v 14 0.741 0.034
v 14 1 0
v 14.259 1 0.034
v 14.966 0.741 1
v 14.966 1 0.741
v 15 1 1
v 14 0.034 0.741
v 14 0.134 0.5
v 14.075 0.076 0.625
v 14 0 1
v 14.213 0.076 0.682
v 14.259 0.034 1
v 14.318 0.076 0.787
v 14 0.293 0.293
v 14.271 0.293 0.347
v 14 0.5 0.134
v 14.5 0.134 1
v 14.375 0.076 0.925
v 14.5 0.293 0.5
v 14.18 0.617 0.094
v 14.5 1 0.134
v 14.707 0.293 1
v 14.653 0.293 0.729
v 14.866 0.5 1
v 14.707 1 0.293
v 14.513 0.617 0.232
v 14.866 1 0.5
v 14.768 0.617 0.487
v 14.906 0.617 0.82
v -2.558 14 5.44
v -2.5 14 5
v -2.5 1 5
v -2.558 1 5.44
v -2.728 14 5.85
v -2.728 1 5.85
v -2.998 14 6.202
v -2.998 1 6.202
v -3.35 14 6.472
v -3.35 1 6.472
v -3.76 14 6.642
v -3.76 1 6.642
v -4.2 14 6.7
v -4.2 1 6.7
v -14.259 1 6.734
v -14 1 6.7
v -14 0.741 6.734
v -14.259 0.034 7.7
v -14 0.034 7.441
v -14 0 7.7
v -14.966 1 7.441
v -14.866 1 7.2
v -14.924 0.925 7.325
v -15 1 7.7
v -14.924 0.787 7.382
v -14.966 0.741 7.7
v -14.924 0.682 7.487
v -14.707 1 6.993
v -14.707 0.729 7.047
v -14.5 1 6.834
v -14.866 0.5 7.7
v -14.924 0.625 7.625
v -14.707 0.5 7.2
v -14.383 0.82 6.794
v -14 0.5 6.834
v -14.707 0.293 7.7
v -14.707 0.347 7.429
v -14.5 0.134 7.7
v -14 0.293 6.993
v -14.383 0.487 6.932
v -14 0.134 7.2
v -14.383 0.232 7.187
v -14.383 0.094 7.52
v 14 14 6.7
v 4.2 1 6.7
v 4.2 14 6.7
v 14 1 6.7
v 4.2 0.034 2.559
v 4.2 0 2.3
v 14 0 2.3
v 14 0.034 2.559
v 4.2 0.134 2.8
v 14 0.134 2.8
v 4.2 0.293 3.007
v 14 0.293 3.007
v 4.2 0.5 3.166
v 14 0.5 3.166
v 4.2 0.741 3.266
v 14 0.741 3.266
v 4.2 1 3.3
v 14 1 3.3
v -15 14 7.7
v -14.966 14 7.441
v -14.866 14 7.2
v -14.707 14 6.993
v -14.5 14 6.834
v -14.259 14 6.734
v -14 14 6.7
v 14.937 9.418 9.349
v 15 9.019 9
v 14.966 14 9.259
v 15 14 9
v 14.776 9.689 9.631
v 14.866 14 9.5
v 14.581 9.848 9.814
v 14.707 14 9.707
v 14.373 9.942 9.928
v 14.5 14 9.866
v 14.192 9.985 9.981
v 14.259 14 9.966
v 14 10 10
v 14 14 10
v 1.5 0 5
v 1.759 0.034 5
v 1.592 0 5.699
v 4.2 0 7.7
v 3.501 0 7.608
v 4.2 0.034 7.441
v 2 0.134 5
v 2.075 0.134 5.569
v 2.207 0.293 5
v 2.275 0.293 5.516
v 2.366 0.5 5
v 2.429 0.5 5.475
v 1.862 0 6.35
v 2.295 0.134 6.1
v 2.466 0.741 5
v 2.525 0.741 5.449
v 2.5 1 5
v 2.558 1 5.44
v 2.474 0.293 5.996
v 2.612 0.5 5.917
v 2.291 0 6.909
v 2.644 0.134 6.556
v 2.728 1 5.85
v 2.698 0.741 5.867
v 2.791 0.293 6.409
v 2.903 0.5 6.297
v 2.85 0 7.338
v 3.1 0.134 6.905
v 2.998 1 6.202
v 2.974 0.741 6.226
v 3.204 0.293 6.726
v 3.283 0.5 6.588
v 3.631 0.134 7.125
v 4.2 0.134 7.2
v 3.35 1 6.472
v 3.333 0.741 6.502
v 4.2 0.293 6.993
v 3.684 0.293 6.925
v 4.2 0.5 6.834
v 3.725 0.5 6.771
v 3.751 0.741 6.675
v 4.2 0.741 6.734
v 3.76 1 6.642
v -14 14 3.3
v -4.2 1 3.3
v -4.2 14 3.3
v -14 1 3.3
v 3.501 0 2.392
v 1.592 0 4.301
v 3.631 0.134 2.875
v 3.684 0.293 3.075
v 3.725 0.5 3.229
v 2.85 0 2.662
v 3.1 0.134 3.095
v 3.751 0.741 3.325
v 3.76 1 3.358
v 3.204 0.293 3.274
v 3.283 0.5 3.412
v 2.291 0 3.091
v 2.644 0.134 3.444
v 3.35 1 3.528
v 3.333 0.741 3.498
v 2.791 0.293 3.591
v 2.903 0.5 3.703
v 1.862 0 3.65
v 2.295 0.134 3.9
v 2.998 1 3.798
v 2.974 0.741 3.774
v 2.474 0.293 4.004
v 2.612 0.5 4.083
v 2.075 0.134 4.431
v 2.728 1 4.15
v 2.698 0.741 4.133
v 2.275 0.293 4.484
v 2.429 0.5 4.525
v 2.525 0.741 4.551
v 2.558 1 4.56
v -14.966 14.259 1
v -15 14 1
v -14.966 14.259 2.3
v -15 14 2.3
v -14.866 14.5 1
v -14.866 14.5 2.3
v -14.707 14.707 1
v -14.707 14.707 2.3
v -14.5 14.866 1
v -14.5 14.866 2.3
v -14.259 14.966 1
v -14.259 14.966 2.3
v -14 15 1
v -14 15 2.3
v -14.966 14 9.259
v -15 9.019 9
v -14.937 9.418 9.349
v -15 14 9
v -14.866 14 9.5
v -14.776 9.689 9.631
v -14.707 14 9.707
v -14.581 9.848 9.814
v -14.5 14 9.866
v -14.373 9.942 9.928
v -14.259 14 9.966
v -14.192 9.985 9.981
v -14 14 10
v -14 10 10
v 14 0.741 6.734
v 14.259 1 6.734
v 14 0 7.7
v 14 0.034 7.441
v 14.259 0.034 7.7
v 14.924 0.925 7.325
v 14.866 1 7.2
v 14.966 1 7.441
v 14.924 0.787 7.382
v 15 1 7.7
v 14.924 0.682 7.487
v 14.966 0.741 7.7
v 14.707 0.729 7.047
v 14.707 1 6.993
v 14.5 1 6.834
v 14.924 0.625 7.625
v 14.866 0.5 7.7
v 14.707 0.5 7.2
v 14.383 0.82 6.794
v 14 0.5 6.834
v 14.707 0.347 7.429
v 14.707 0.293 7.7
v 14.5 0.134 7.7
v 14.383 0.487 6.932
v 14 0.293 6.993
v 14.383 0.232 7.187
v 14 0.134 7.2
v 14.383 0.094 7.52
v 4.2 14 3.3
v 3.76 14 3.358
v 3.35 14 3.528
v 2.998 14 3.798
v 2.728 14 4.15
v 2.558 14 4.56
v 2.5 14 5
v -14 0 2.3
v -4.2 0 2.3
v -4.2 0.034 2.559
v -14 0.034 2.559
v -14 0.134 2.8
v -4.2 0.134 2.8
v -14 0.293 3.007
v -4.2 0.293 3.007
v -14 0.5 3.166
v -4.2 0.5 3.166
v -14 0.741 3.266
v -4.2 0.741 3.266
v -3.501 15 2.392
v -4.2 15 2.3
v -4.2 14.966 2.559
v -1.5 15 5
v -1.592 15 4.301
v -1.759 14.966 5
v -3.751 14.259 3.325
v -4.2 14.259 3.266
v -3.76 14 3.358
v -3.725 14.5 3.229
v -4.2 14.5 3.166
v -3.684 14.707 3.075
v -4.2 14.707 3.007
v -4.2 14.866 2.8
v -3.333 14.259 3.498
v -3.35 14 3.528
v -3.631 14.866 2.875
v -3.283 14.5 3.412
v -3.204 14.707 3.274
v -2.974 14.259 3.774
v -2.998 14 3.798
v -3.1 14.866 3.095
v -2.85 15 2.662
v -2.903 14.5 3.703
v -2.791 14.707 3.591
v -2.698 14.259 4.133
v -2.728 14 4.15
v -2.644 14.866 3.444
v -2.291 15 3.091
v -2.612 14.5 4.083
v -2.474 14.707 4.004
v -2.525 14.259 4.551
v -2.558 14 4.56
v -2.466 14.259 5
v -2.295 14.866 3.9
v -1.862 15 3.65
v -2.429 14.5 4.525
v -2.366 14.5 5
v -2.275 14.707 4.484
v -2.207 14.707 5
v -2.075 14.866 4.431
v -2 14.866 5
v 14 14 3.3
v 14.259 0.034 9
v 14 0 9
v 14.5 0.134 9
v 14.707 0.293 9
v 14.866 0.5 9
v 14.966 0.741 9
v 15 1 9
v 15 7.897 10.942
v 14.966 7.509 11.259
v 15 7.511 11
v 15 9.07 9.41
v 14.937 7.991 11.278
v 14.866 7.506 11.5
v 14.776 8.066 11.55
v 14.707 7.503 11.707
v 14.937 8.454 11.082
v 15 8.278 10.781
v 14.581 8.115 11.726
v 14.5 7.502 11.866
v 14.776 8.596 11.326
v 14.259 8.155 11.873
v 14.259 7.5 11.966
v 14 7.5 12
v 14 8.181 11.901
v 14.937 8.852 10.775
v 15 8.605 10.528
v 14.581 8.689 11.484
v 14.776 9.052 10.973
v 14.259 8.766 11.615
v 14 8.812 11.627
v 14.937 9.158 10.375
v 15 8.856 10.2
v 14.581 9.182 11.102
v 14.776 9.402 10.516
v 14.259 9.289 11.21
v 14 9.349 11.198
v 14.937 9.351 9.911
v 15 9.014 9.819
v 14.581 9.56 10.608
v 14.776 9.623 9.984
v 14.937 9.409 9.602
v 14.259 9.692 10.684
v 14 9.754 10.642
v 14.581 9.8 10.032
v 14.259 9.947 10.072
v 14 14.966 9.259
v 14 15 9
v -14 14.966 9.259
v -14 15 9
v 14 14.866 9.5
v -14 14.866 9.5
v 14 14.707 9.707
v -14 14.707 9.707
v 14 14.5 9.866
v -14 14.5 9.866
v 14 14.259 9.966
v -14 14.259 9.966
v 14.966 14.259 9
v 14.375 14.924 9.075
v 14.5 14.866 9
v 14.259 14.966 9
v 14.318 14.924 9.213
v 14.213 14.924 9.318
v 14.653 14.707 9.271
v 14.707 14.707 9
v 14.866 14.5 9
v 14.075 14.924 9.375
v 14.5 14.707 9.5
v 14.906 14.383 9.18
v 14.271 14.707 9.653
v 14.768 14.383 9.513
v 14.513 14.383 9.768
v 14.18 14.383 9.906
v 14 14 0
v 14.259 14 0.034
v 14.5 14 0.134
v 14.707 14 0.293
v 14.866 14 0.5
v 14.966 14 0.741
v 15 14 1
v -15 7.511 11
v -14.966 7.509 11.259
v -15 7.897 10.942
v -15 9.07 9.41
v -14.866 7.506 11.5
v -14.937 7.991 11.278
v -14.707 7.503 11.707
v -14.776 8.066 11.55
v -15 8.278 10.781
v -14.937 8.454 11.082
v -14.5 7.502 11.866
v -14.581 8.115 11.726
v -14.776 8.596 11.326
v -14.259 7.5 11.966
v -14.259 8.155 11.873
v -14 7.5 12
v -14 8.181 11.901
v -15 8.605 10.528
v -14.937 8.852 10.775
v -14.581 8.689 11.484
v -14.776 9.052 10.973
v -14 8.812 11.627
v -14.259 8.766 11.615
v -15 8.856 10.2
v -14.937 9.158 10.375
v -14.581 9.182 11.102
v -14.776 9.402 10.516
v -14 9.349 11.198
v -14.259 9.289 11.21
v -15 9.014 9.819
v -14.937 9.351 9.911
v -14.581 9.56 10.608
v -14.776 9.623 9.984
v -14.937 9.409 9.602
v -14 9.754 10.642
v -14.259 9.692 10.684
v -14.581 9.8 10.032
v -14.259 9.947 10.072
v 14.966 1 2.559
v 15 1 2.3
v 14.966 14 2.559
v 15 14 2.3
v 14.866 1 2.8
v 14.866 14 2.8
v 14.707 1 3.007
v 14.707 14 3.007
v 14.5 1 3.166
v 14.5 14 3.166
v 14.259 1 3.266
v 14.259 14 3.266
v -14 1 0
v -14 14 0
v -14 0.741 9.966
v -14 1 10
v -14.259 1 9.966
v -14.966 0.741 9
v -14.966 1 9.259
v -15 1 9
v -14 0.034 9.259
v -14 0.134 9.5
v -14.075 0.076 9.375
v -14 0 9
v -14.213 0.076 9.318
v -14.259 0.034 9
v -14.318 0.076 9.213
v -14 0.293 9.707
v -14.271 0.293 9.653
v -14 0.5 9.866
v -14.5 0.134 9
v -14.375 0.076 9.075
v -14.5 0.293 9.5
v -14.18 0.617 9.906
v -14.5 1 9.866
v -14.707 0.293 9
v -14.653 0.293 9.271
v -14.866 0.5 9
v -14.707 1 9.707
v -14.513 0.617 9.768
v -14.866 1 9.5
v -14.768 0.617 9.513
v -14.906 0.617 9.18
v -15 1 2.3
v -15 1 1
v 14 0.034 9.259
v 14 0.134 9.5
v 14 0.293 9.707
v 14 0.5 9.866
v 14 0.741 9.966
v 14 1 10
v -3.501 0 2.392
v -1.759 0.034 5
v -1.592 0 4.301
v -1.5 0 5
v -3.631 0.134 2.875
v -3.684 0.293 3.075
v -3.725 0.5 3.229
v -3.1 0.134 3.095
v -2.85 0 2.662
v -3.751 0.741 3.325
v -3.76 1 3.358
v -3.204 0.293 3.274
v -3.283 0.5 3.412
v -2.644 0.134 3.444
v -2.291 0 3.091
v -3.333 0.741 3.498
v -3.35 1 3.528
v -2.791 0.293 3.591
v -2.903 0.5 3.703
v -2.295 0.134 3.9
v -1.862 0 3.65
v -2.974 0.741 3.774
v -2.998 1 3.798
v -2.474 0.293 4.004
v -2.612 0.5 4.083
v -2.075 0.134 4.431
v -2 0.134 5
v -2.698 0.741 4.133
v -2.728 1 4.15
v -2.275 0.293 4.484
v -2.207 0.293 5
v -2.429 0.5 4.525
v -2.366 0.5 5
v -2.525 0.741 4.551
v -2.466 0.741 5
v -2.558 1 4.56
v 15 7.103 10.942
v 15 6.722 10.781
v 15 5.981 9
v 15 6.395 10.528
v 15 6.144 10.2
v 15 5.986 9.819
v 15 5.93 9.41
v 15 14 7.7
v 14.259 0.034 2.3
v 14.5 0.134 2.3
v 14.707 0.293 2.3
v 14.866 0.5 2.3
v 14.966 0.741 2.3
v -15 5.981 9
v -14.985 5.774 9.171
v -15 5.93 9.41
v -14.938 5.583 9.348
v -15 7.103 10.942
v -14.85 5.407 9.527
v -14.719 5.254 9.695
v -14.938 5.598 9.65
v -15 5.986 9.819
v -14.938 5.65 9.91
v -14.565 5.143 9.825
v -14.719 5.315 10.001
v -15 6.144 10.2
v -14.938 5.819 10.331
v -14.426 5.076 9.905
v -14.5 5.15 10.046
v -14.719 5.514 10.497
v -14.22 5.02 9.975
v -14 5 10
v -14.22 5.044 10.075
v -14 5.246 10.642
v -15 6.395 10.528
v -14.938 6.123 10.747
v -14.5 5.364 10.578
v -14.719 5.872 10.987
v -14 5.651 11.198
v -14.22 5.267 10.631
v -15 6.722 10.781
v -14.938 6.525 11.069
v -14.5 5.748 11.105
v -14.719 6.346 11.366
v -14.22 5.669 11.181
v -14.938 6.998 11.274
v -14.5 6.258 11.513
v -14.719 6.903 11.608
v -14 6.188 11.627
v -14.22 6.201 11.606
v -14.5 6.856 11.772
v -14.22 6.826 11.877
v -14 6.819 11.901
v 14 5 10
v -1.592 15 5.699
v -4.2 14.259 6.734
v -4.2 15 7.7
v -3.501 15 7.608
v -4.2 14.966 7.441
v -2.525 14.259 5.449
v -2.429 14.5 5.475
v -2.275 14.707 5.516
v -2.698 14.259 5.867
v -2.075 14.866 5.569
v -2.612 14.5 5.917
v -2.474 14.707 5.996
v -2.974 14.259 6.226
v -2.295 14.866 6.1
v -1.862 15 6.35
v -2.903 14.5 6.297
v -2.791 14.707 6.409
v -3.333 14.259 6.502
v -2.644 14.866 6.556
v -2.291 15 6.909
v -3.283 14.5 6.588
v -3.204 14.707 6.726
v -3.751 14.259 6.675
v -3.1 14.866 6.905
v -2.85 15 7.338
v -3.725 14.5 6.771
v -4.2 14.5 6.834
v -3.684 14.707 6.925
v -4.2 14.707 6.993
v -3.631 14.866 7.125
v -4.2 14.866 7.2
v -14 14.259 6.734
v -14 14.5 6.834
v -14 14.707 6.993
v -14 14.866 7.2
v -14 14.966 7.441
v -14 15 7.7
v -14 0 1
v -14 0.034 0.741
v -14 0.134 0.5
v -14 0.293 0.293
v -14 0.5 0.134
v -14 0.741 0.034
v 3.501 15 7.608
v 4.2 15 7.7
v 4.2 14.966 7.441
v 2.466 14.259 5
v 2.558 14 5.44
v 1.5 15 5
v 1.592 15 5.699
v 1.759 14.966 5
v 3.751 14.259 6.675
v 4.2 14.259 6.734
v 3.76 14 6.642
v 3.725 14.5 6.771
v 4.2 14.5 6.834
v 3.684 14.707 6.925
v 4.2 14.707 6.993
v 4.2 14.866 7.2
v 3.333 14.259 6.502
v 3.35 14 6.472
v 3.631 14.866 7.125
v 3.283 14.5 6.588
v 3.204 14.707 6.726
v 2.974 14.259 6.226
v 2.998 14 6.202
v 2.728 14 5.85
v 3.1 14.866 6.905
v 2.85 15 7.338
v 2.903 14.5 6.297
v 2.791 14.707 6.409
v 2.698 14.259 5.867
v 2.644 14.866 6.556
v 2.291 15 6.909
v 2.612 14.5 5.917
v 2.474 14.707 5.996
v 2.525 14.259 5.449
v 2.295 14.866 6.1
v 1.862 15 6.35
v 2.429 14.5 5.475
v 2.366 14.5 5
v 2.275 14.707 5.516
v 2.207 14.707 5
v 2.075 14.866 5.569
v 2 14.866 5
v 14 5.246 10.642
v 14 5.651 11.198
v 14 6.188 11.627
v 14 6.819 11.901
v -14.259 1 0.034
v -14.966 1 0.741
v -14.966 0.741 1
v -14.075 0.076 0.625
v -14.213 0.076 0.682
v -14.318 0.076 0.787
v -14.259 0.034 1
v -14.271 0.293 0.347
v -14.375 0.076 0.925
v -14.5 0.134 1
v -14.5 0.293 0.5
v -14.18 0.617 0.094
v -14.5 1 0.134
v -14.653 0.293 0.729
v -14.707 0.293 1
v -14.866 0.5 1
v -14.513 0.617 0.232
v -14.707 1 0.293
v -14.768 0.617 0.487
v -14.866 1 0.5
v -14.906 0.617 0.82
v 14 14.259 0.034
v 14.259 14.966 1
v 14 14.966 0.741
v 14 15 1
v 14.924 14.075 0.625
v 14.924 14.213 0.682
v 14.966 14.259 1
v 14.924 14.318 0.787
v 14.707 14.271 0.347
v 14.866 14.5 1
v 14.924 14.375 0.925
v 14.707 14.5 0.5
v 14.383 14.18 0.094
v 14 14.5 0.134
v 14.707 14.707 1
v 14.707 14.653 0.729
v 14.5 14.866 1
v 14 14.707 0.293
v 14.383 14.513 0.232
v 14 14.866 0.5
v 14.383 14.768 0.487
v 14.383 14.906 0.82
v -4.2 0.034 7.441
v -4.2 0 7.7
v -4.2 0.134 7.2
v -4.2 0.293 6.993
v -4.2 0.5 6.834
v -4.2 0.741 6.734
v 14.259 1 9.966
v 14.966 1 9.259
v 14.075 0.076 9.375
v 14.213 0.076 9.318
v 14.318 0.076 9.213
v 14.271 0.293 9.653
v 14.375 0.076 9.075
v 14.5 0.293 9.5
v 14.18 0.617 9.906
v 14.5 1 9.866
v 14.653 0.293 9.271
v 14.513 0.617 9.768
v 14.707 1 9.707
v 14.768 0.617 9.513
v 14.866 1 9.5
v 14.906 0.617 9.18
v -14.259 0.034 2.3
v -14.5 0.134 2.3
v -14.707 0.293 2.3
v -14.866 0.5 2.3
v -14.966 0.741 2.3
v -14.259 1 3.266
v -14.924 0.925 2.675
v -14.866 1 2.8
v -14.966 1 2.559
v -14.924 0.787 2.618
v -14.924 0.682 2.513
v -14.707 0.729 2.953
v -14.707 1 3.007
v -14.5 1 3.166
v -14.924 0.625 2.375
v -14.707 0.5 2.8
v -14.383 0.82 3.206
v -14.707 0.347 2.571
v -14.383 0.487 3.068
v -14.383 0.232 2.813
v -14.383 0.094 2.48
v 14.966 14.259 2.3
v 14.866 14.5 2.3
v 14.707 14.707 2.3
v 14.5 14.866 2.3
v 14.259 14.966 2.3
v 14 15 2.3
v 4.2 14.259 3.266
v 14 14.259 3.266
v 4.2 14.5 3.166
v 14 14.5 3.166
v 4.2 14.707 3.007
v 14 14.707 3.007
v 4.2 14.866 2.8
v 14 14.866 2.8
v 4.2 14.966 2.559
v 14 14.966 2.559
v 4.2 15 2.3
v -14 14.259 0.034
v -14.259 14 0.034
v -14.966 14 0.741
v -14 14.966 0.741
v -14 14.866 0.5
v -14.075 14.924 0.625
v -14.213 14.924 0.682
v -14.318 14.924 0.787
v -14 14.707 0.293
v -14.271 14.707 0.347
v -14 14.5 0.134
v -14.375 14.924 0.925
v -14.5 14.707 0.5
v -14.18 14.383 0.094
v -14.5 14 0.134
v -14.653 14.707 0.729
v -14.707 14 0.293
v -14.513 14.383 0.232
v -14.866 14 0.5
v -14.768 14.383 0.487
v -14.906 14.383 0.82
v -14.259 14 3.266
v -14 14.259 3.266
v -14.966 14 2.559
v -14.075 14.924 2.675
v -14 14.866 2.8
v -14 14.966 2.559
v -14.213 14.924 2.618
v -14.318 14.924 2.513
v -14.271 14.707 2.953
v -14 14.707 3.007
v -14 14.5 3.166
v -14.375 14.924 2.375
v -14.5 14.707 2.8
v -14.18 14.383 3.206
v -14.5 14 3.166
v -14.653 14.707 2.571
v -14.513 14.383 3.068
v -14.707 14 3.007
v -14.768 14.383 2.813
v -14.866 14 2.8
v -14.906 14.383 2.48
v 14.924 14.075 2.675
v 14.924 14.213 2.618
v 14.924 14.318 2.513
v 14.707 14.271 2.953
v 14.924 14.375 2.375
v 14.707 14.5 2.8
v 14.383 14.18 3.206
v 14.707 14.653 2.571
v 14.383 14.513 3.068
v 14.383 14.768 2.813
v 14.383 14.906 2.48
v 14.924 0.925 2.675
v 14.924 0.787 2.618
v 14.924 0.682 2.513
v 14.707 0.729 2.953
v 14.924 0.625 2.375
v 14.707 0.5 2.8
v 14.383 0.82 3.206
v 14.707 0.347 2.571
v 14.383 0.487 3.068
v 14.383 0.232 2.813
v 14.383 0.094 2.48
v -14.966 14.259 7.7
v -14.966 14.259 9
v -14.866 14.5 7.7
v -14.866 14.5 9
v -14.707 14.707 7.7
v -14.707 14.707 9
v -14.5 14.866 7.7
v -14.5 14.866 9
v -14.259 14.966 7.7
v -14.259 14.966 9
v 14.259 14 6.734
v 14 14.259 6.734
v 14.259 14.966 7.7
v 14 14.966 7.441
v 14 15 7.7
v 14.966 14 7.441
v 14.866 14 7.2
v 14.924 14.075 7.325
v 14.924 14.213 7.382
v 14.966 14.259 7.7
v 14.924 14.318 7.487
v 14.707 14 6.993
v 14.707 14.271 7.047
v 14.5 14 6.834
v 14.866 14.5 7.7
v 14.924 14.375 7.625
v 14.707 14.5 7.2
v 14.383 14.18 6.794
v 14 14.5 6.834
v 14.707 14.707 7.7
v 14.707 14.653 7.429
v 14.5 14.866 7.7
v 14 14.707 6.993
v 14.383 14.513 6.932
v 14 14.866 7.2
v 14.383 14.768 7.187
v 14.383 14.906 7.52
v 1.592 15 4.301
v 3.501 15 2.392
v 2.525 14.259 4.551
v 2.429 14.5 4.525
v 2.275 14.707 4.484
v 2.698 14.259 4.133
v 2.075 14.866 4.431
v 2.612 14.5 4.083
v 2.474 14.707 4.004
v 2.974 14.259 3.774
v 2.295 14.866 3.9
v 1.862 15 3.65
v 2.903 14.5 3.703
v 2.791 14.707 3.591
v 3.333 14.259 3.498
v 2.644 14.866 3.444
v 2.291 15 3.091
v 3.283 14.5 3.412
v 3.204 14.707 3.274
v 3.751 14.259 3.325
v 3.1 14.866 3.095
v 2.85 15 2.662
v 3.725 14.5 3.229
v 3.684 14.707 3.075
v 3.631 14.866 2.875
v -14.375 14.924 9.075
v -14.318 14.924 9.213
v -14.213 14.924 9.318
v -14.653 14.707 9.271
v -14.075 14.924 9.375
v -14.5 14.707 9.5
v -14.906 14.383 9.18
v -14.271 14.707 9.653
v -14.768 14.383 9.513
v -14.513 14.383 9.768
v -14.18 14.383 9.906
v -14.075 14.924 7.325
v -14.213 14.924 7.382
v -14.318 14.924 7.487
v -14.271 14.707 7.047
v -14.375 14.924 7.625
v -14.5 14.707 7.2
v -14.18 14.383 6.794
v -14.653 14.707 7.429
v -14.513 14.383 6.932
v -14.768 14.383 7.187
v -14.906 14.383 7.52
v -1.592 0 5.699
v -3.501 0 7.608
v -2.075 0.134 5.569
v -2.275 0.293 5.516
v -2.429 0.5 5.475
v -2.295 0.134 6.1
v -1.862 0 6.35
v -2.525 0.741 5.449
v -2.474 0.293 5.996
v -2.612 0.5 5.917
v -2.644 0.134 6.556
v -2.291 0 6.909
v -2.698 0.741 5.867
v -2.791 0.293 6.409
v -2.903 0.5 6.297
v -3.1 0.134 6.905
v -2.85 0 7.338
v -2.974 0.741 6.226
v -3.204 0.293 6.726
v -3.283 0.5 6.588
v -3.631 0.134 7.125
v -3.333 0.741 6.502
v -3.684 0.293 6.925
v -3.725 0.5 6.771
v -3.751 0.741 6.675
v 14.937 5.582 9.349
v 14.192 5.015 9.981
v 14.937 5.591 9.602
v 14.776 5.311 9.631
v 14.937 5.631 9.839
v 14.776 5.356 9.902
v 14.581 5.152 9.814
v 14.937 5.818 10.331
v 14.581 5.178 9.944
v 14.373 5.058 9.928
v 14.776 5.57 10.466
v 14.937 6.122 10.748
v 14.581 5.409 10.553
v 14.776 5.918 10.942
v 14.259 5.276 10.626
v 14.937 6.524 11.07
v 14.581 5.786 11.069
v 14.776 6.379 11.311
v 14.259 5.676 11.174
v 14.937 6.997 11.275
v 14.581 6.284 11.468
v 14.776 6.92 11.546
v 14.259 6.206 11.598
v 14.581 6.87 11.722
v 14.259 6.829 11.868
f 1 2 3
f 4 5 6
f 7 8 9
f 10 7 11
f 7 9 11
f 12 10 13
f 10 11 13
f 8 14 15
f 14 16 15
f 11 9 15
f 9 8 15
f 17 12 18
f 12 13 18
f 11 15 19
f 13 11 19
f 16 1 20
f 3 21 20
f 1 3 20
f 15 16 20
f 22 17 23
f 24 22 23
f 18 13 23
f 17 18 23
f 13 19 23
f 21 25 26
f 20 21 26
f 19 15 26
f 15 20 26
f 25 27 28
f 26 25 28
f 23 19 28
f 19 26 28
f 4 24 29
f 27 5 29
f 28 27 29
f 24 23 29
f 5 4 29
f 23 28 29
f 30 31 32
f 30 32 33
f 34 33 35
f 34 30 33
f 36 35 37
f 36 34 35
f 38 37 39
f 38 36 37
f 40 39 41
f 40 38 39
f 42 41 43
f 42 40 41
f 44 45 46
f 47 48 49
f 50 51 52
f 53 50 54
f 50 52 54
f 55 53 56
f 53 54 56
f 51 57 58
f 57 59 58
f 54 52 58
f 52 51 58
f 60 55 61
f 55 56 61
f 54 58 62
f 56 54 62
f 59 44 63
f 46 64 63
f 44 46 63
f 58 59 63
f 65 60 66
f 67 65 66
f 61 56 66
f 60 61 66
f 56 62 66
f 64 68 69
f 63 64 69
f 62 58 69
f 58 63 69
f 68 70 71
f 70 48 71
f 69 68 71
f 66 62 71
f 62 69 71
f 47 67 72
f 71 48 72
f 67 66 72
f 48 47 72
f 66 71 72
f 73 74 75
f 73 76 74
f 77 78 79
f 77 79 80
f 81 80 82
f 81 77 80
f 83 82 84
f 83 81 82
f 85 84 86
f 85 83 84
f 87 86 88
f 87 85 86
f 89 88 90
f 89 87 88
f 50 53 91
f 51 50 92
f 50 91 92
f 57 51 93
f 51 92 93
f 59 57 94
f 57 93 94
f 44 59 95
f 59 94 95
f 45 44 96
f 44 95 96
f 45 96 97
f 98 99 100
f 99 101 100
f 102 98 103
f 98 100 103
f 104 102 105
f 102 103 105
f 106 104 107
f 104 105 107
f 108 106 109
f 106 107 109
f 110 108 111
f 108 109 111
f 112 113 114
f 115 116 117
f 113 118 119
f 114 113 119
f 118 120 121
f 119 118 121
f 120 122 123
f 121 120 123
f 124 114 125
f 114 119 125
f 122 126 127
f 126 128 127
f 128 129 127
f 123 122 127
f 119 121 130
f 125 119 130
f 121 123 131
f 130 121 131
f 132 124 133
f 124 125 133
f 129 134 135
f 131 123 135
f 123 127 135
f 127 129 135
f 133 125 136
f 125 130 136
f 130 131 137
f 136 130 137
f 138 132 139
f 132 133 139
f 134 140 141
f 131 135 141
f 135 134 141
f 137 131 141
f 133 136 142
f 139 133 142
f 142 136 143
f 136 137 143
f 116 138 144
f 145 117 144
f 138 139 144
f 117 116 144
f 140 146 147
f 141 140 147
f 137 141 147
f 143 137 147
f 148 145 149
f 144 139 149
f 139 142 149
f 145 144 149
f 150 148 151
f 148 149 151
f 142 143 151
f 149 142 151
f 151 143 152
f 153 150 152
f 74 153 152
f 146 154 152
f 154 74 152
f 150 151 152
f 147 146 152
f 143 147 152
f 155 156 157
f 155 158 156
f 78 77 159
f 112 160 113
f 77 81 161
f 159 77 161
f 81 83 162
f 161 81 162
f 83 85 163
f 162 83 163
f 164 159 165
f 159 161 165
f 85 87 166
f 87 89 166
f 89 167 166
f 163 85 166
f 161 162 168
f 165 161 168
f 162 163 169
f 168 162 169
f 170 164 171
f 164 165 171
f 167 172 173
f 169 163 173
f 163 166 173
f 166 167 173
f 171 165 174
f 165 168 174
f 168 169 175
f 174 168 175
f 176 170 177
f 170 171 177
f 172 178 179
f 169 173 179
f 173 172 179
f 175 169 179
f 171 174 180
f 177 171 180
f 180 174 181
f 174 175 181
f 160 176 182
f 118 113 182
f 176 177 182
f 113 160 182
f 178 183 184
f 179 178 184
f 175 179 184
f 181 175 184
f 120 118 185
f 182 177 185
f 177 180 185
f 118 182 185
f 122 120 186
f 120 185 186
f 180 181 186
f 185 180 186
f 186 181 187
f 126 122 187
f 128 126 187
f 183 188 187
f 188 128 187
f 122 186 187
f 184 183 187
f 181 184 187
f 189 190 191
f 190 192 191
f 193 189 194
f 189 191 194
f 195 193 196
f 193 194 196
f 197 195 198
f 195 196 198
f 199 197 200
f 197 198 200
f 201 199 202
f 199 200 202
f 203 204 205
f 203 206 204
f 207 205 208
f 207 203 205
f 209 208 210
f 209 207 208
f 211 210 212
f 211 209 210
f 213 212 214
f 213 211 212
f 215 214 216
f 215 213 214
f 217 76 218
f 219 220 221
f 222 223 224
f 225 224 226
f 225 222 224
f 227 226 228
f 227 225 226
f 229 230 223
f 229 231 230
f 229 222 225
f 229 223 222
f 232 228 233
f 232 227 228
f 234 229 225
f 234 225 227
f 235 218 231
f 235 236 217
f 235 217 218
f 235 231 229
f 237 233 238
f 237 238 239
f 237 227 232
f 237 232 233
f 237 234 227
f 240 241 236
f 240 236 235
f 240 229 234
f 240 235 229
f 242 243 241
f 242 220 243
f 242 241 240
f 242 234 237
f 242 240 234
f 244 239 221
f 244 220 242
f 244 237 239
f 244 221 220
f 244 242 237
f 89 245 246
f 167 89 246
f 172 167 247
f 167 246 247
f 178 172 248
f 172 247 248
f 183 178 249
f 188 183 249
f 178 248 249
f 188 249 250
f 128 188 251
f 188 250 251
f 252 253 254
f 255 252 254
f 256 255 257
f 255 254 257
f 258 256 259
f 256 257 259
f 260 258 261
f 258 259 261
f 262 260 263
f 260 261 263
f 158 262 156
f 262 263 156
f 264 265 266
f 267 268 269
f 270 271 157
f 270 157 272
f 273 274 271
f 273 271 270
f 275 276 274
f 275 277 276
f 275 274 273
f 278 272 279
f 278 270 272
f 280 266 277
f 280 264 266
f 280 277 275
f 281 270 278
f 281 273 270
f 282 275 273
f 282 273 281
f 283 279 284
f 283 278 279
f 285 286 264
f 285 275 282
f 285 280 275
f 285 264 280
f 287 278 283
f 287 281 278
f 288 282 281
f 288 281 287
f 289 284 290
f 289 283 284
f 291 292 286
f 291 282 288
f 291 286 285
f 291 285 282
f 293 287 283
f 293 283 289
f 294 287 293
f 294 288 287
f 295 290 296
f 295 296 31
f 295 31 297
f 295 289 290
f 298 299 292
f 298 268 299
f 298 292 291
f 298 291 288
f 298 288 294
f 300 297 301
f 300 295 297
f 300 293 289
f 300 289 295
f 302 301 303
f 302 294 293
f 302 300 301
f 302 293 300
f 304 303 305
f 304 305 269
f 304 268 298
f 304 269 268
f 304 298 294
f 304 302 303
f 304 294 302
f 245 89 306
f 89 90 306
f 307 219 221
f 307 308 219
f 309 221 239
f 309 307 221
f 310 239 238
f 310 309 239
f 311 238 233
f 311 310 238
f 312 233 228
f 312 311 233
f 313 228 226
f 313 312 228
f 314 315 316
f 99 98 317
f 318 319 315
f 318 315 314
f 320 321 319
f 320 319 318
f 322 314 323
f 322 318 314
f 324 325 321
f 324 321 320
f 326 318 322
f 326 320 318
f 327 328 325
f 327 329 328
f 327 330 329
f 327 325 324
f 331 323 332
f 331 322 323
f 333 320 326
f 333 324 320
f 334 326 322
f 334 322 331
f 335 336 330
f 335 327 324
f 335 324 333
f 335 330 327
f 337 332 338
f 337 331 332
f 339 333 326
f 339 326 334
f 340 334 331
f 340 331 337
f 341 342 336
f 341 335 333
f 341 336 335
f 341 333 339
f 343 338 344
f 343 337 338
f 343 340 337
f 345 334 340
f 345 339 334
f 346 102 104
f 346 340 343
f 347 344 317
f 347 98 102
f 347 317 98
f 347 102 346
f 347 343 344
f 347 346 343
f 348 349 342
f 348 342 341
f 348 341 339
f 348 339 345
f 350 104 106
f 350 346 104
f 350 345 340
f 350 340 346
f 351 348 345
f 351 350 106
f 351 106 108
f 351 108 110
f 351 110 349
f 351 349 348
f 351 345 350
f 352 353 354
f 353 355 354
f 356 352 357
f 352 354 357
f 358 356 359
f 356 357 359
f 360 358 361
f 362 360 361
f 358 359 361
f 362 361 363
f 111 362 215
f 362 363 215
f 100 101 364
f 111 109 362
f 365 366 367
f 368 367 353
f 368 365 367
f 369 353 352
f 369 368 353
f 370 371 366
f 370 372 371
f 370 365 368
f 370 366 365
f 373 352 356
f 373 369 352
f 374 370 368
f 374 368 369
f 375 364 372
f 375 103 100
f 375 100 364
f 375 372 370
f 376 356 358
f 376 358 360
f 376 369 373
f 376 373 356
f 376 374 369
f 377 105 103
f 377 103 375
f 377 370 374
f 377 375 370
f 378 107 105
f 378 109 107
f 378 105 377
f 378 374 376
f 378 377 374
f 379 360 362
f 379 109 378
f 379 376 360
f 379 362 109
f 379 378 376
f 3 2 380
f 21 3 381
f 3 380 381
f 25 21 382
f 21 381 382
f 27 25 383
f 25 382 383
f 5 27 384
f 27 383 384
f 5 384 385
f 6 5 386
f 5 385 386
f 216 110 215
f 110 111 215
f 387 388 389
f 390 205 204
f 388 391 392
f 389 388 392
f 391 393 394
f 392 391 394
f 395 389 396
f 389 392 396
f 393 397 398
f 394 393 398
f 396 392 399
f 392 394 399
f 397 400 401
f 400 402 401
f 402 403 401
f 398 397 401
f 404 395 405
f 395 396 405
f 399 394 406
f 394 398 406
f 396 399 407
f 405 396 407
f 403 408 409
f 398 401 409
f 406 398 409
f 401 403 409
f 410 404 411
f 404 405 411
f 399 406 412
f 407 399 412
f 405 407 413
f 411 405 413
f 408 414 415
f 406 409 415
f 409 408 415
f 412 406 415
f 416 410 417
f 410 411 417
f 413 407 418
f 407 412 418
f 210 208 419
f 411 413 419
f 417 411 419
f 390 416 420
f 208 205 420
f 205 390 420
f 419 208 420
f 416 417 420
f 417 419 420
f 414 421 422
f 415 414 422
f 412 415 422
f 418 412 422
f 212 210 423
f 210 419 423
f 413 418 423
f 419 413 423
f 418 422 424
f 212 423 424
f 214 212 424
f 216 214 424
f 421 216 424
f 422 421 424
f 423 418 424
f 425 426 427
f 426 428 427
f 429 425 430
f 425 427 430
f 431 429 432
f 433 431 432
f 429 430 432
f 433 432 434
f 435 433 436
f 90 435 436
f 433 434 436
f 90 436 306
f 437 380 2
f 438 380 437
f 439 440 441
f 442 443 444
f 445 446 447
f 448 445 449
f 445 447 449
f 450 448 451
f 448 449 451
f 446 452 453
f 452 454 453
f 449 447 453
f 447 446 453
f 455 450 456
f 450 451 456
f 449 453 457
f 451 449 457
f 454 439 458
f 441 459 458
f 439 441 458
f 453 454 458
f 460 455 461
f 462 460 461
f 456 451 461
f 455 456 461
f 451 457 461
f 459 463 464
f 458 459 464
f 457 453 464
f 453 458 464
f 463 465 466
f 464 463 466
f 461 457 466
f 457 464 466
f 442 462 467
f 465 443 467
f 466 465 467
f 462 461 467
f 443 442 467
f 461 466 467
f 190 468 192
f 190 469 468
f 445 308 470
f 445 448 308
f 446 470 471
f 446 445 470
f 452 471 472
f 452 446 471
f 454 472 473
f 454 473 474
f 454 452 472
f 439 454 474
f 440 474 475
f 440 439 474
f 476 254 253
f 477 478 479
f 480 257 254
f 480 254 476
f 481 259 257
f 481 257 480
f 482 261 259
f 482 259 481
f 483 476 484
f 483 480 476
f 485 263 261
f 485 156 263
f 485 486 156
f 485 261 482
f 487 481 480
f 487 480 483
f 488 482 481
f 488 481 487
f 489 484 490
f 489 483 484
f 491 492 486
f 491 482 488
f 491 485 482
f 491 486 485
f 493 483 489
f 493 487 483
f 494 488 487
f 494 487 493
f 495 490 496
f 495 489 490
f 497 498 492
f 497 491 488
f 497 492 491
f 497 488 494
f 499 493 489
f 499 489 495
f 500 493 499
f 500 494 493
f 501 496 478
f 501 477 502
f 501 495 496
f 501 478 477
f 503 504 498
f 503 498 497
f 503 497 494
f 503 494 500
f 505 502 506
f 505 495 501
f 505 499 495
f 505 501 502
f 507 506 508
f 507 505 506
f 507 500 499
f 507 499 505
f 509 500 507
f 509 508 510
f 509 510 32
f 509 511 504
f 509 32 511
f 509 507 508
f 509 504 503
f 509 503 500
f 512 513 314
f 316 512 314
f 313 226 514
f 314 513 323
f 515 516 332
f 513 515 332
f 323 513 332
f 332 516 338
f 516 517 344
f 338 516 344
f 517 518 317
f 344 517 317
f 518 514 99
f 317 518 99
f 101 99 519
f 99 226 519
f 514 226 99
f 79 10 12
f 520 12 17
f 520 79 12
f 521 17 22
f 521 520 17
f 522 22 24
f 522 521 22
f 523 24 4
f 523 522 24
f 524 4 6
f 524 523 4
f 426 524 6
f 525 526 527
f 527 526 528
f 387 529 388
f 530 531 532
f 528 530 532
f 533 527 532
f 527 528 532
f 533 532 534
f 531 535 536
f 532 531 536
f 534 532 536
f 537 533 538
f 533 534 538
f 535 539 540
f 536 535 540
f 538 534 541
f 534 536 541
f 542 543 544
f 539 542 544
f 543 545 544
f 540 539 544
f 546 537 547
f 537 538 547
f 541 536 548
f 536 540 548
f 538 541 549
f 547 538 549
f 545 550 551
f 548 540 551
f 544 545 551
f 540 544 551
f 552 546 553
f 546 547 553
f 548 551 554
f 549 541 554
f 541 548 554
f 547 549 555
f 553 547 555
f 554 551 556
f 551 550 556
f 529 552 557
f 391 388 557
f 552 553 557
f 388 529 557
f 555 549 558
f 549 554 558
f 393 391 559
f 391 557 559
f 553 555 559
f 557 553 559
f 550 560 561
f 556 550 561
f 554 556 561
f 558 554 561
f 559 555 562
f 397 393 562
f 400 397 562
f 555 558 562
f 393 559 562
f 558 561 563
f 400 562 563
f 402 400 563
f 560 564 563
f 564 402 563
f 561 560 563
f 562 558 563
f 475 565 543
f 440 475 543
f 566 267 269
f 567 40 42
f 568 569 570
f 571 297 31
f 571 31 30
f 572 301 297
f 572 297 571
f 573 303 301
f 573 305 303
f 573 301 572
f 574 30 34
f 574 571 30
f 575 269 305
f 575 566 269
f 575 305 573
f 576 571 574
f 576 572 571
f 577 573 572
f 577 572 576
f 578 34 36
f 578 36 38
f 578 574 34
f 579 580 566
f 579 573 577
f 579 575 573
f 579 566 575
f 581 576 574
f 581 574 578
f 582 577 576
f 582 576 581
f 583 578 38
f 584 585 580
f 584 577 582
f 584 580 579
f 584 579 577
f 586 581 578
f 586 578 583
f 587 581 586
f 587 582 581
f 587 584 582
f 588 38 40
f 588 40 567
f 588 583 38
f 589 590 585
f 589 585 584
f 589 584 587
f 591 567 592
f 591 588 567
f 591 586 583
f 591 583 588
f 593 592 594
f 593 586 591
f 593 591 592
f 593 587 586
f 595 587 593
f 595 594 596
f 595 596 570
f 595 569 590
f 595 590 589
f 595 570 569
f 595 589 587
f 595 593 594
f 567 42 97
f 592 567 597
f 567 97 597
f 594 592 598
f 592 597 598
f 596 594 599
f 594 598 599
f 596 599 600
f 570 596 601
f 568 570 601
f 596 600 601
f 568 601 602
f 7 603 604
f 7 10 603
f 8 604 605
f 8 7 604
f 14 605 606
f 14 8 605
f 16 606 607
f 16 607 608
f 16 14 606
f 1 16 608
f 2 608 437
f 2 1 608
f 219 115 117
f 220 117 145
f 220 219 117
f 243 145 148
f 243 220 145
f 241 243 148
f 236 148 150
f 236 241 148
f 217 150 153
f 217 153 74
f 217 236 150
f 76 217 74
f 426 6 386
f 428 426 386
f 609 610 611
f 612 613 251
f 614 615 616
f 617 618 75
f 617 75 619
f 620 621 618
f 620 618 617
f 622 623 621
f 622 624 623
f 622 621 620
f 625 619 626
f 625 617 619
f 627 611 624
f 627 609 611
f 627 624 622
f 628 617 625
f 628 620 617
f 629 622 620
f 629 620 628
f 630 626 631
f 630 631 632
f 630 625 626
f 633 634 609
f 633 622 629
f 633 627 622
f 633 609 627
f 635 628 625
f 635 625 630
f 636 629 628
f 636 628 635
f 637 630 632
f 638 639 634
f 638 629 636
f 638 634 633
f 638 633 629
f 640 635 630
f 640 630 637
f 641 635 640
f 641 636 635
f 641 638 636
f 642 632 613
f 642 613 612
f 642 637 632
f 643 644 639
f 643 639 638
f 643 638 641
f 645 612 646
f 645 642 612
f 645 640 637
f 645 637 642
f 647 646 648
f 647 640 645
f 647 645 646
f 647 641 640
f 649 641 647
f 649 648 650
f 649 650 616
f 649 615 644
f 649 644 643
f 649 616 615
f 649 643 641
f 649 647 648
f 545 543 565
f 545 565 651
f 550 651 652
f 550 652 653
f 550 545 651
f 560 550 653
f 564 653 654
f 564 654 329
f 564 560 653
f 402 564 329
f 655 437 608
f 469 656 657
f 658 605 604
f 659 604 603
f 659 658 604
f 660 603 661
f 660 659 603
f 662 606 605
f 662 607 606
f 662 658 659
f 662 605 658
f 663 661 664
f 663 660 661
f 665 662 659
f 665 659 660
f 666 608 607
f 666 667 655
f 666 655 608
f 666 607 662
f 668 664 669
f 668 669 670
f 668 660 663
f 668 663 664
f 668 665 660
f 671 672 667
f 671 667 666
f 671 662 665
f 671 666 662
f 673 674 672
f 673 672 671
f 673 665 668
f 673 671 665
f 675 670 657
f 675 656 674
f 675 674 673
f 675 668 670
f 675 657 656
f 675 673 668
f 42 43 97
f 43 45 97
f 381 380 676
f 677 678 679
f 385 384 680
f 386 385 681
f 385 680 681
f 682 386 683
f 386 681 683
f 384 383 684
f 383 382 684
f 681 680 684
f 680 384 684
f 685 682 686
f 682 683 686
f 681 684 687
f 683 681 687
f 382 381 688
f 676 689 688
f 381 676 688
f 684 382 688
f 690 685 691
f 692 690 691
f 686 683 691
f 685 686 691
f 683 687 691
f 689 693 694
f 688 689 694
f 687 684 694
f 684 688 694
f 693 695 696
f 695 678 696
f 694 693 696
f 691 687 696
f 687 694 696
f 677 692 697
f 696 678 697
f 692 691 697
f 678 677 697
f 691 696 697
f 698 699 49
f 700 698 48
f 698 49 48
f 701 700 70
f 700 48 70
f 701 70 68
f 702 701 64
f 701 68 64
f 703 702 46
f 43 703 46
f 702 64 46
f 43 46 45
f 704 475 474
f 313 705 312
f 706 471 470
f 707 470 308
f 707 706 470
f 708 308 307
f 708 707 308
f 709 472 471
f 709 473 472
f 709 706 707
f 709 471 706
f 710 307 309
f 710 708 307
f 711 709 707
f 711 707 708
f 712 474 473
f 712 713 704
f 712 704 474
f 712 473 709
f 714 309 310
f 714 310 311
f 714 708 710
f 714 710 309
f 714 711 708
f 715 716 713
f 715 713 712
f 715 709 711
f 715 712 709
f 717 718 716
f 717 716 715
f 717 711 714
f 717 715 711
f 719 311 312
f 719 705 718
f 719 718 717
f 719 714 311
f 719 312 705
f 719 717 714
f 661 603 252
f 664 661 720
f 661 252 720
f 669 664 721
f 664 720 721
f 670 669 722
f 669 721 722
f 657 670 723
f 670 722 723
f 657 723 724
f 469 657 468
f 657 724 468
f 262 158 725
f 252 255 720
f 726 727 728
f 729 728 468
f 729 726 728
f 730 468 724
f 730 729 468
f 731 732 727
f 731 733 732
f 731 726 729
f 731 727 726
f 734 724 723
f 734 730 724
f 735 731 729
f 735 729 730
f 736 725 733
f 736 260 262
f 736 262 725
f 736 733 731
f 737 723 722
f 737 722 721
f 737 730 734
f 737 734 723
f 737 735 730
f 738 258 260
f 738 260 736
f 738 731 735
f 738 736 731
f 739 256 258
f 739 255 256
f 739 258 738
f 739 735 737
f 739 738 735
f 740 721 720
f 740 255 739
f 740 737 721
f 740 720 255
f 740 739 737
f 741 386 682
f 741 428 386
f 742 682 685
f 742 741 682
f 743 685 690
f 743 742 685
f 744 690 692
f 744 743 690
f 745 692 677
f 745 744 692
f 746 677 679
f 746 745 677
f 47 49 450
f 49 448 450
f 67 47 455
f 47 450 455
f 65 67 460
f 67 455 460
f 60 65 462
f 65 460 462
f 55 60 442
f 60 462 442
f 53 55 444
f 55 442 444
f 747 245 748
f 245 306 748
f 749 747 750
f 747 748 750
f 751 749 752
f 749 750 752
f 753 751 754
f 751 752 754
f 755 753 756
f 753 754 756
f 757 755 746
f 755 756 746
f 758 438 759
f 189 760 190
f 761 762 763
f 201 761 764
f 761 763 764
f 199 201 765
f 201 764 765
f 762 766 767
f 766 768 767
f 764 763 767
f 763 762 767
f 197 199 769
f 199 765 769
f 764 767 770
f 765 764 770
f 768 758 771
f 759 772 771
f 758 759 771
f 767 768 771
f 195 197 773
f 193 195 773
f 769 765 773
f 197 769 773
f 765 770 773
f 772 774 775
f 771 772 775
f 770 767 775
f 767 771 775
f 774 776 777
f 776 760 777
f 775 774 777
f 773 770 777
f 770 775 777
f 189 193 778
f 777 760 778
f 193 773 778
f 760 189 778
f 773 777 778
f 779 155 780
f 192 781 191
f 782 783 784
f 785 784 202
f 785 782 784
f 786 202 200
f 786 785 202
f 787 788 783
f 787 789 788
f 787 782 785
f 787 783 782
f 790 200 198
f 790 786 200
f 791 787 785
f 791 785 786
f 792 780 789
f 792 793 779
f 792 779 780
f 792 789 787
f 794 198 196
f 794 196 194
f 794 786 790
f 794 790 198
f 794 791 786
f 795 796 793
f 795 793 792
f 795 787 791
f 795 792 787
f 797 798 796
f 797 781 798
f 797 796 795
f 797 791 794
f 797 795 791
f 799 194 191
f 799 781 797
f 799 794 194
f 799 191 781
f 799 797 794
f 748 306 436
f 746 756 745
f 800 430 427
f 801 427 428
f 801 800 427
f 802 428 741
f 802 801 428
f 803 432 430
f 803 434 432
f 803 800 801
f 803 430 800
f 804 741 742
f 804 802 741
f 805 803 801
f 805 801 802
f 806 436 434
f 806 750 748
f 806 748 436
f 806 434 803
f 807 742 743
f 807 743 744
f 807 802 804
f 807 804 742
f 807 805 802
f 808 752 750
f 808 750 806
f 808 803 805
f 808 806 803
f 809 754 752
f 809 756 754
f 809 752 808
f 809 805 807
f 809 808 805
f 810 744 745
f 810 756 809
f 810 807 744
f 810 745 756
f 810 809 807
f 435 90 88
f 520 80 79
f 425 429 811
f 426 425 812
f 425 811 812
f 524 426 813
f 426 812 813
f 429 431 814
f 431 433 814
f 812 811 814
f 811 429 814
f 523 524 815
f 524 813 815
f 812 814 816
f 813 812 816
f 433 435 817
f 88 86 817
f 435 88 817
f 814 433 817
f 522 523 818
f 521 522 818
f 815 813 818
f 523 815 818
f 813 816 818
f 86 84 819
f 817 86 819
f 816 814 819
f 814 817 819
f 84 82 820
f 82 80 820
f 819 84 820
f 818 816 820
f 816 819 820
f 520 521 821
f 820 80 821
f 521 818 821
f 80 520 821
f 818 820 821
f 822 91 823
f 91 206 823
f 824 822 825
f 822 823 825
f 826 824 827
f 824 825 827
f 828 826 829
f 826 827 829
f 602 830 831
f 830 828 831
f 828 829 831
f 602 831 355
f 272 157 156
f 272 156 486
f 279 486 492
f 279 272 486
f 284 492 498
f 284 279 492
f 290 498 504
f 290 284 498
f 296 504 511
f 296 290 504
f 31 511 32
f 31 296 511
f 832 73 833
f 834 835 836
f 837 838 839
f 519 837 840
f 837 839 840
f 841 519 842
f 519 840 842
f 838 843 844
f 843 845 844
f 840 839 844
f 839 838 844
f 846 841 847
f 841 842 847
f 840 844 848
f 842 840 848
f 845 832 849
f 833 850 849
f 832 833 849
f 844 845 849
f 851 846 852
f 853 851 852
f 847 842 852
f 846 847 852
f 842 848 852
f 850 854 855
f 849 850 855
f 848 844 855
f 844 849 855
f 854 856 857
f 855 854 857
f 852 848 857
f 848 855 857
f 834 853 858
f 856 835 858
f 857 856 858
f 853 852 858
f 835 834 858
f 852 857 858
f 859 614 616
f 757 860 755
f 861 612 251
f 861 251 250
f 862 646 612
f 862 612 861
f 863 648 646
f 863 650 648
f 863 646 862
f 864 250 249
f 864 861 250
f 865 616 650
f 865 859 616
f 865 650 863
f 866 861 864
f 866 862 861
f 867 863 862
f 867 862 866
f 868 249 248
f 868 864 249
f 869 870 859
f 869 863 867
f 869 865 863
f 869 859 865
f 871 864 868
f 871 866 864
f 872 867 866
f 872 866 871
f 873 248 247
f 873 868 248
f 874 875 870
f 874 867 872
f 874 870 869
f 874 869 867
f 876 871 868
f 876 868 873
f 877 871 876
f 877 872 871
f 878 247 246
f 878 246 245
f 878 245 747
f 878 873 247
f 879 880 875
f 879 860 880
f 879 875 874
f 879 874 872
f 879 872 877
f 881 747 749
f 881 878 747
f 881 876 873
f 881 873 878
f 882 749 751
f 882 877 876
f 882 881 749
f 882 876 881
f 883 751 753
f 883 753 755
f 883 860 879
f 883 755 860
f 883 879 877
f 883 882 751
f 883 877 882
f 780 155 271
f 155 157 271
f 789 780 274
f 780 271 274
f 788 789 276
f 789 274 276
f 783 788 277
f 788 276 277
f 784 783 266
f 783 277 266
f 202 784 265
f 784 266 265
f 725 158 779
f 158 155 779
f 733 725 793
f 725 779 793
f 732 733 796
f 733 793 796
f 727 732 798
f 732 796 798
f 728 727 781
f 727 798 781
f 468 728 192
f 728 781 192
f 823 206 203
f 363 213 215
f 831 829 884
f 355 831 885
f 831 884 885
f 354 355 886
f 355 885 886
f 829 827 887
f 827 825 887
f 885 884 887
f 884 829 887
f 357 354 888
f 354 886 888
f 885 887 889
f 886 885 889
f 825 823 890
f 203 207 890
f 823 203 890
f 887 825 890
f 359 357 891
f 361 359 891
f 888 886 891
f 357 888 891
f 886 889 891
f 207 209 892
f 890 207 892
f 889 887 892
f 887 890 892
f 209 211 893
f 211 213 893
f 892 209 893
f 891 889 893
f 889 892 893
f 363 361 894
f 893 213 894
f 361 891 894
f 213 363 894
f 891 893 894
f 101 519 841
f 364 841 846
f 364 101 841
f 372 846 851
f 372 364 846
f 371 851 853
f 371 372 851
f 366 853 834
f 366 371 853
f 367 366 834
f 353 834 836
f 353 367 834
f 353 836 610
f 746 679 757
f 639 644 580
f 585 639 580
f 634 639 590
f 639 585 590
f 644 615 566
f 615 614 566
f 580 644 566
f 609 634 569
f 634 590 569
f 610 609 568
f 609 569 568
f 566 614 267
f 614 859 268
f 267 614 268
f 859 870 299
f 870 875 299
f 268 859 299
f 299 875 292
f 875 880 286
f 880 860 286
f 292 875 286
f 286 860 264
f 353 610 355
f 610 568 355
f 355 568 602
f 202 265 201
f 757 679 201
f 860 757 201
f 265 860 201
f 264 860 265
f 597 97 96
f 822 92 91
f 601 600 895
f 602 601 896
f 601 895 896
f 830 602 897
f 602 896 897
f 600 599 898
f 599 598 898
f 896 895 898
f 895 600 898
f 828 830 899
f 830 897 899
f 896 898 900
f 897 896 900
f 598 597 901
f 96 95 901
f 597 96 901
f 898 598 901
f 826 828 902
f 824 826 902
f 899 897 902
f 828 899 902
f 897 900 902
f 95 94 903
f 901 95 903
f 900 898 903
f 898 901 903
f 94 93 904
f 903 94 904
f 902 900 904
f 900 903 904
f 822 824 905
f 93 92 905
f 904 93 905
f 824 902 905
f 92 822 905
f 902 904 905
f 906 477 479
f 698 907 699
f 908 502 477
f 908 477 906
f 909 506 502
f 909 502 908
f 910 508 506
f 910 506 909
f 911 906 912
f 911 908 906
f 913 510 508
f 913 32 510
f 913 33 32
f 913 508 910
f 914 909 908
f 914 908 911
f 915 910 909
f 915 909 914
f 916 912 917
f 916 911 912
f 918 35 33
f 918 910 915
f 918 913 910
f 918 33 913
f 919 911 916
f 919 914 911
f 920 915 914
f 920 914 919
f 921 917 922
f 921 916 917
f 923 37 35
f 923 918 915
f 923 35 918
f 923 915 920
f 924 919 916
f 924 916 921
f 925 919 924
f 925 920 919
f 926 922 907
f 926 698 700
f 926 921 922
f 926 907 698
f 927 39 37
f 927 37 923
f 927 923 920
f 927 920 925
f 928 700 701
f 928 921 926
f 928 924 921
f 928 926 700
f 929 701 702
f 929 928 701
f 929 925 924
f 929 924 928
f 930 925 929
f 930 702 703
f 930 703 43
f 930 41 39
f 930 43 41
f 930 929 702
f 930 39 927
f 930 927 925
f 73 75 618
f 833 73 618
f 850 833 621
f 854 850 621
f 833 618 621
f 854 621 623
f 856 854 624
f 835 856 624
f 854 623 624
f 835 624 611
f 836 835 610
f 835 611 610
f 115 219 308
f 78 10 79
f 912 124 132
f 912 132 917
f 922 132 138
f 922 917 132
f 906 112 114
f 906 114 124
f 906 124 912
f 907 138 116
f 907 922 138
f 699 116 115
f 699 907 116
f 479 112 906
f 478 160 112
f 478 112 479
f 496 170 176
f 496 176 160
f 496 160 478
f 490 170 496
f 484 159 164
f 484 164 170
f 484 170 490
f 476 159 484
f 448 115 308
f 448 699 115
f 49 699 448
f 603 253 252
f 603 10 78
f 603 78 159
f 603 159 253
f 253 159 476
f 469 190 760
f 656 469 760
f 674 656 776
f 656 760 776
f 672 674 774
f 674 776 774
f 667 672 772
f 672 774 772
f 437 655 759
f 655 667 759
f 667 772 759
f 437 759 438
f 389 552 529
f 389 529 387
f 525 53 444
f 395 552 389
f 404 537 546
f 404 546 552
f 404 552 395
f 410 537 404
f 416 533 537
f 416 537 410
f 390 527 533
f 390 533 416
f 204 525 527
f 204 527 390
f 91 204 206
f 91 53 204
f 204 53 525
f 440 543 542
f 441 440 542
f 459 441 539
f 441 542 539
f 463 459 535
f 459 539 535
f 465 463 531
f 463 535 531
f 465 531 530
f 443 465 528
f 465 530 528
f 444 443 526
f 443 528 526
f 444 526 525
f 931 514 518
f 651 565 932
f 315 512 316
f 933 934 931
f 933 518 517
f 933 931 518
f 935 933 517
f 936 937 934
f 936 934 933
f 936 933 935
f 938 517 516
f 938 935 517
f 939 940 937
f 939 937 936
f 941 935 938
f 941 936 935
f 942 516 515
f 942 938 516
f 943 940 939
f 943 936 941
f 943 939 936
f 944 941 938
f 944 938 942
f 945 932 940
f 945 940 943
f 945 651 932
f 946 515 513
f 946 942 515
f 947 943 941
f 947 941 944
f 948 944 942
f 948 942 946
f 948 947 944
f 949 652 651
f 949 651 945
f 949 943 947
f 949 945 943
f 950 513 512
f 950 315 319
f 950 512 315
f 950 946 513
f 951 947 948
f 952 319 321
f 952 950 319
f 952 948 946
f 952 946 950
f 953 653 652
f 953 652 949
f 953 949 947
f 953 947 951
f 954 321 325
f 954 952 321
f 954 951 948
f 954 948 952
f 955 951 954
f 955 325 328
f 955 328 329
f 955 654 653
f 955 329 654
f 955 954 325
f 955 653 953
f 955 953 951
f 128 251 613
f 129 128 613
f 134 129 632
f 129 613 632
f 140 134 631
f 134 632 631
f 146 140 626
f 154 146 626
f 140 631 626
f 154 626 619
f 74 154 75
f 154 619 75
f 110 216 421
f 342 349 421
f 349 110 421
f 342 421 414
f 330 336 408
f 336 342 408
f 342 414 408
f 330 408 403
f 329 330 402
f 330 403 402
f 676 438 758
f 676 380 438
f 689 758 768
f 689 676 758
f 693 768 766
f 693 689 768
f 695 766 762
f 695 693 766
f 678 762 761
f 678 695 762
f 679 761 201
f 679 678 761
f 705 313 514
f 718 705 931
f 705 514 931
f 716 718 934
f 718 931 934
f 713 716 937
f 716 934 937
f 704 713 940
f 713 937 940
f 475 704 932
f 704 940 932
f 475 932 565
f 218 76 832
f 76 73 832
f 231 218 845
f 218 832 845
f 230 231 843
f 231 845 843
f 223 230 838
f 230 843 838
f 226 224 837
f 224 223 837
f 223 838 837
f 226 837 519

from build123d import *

# Parameters (mm, degrees)
F0_W        = 15
F0_H        = 15
F1_DEPTH    = 10
F2_W        = 15
F2_H        = 3.4
F3_DEPTH    = 12.5
F4_R        = 1.69999
F6_W        = 5
F6_H        = 2
F7_DEPTH    = 30
F8_T1_DEPTH = 42.6491106407
F9_R        = 1


# Not quite as in the source:
# - a fillet or chamfer that OpenCascade refuses, or shapes differently, is made with other operations: its cross-section is extruded or revolved along the edge and cut away or added
# - a fillet or chamfer is up to 0.001 mm smaller than in the source, because OpenCascade refuses the exact size


with BuildPart() as f1:
    # F0 (on Top) → F1 (new body)
    with BuildSketch(Plane.XY):
        with Locations((7.5, 7.5)):
            Rectangle(F0_W, F0_H)
    extrude(amount=F1_DEPTH)

    # F2 (on face) → F3 (cut)
    with BuildSketch(Plane.YZ.offset(15)):
        with Locations((7.5, 5)):
            Rectangle(F2_W, F2_H)
    extrude(amount=-F3_DEPTH, mode=Mode.SUBTRACT)

    # F4 (radius 1.7 in the source; OpenCascade refuses exactly that, so slightly less here)
    f4_edges = [f1.edges().sort_by_distance(p)[0] for p in [
        (2.5, 7.5, 3.3),
        (2.5, 7.5, 6.7),
    ]]
    fillet(f4_edges, radius=F4_R)

    # F5: F1 across face


with BuildPart() as f1_1:
    add(f1.part)
    add(f1.part.mirror(Plane(origin=(0, 7.5, 5), x_dir=(0, -1, 0), z_dir=(-1, 0, 0))))

    # F6 (on face) → F7 (join, through all)
    with BuildSketch(Plane.YZ.offset(15)):
        with Locations((7.5, 11)):
            Rectangle(F6_W, F6_H)
    extrude(amount=-F7_DEPTH)

    # F8: fillet of radius 2.6 on 2 edges, made by hand

    # F8_s2 → F8_t1 (cut)
    with BuildSketch(Plane.YZ.offset(-21.3245553203)):
        with BuildLine():
            ThreePointArc((5, 10), (5.9173705785, 11.4396078054), (7.5298221281, 12))
            Line((7.5298221281, 12), (5, 12))
            Line((5, 12), (5, 10))
        make_face()
        with BuildLine():
            ThreePointArc((10, 10), (9.0826294215, 11.4396078054), (7.4701778719, 12))
            Line((7.4701778719, 12), (10, 12))
            Line((10, 12), (10, 10))
        make_face()
    extrude(amount=F8_T1_DEPTH, mode=Mode.SUBTRACT)

    # F9
    f9_edges = [f1_1.edges().sort_by_distance(p)[0] for p in [
        (-9.599995, 0, 3.3),
        (9.599995, 0, 3.3),
        (-15, 7.5, 3.3),
        (-15, 7.5, 0),
        (-15, 7.5, 6.7),
        (0, 15, 0),
        (-9.599995, 15, 3.3),
        (9.599995, 15, 6.7),
        (15, 7.5, 0),
        (15, 7.5, 6.7),
        (15, 7.5, 3.3),
        (0, 0, 0),
        (-15, 15, 1.65),
        (15, 15, 1.65),
        (15, 0, 1.65),
        (-15, 0, 1.65),
        (15, 5.9057, 11.430327),
        (15, 2.5, 10),
        (15, 12.5, 10),
        (-15, 2.5, 10),
        (-15, 12.5, 10),
        (0, 0, 10),
        (-15, 0, 8.35),
        (15, 0, 8.35),
        (-15, 15, 8.35),
        (15, 15, 8.35),
        (15, 9.0943, 11.430327),
        (-15, 9.0943, 11.430327),
        (-15, 5.9057, 11.430327),
        (0, 15, 10),
        (-9.599995, 15, 6.7),
        (-2.997916, 15, 6.202084),
        (-2.5, 15, 5),
        (-2.997916, 15, 3.797916),
        (9.599995, 15, 3.3),
        (2.997916, 15, 3.797916),
        (2.5, 15, 5),
        (2.997916, 15, 6.202084),
        (9.599995, 0, 6.7),
        (-9.599995, 0, 6.7),
        (-2.997916, 0, 6.202084),
        (-2.5, 0, 5),
        (-2.997916, 0, 3.797916),
        (2.997916, 0, 3.797916),
        (2.5, 0, 5),
        (2.997916, 0, 6.202084),
    ]]
    fillet(f9_edges, radius=F9_R)


solid = f1_1.part
